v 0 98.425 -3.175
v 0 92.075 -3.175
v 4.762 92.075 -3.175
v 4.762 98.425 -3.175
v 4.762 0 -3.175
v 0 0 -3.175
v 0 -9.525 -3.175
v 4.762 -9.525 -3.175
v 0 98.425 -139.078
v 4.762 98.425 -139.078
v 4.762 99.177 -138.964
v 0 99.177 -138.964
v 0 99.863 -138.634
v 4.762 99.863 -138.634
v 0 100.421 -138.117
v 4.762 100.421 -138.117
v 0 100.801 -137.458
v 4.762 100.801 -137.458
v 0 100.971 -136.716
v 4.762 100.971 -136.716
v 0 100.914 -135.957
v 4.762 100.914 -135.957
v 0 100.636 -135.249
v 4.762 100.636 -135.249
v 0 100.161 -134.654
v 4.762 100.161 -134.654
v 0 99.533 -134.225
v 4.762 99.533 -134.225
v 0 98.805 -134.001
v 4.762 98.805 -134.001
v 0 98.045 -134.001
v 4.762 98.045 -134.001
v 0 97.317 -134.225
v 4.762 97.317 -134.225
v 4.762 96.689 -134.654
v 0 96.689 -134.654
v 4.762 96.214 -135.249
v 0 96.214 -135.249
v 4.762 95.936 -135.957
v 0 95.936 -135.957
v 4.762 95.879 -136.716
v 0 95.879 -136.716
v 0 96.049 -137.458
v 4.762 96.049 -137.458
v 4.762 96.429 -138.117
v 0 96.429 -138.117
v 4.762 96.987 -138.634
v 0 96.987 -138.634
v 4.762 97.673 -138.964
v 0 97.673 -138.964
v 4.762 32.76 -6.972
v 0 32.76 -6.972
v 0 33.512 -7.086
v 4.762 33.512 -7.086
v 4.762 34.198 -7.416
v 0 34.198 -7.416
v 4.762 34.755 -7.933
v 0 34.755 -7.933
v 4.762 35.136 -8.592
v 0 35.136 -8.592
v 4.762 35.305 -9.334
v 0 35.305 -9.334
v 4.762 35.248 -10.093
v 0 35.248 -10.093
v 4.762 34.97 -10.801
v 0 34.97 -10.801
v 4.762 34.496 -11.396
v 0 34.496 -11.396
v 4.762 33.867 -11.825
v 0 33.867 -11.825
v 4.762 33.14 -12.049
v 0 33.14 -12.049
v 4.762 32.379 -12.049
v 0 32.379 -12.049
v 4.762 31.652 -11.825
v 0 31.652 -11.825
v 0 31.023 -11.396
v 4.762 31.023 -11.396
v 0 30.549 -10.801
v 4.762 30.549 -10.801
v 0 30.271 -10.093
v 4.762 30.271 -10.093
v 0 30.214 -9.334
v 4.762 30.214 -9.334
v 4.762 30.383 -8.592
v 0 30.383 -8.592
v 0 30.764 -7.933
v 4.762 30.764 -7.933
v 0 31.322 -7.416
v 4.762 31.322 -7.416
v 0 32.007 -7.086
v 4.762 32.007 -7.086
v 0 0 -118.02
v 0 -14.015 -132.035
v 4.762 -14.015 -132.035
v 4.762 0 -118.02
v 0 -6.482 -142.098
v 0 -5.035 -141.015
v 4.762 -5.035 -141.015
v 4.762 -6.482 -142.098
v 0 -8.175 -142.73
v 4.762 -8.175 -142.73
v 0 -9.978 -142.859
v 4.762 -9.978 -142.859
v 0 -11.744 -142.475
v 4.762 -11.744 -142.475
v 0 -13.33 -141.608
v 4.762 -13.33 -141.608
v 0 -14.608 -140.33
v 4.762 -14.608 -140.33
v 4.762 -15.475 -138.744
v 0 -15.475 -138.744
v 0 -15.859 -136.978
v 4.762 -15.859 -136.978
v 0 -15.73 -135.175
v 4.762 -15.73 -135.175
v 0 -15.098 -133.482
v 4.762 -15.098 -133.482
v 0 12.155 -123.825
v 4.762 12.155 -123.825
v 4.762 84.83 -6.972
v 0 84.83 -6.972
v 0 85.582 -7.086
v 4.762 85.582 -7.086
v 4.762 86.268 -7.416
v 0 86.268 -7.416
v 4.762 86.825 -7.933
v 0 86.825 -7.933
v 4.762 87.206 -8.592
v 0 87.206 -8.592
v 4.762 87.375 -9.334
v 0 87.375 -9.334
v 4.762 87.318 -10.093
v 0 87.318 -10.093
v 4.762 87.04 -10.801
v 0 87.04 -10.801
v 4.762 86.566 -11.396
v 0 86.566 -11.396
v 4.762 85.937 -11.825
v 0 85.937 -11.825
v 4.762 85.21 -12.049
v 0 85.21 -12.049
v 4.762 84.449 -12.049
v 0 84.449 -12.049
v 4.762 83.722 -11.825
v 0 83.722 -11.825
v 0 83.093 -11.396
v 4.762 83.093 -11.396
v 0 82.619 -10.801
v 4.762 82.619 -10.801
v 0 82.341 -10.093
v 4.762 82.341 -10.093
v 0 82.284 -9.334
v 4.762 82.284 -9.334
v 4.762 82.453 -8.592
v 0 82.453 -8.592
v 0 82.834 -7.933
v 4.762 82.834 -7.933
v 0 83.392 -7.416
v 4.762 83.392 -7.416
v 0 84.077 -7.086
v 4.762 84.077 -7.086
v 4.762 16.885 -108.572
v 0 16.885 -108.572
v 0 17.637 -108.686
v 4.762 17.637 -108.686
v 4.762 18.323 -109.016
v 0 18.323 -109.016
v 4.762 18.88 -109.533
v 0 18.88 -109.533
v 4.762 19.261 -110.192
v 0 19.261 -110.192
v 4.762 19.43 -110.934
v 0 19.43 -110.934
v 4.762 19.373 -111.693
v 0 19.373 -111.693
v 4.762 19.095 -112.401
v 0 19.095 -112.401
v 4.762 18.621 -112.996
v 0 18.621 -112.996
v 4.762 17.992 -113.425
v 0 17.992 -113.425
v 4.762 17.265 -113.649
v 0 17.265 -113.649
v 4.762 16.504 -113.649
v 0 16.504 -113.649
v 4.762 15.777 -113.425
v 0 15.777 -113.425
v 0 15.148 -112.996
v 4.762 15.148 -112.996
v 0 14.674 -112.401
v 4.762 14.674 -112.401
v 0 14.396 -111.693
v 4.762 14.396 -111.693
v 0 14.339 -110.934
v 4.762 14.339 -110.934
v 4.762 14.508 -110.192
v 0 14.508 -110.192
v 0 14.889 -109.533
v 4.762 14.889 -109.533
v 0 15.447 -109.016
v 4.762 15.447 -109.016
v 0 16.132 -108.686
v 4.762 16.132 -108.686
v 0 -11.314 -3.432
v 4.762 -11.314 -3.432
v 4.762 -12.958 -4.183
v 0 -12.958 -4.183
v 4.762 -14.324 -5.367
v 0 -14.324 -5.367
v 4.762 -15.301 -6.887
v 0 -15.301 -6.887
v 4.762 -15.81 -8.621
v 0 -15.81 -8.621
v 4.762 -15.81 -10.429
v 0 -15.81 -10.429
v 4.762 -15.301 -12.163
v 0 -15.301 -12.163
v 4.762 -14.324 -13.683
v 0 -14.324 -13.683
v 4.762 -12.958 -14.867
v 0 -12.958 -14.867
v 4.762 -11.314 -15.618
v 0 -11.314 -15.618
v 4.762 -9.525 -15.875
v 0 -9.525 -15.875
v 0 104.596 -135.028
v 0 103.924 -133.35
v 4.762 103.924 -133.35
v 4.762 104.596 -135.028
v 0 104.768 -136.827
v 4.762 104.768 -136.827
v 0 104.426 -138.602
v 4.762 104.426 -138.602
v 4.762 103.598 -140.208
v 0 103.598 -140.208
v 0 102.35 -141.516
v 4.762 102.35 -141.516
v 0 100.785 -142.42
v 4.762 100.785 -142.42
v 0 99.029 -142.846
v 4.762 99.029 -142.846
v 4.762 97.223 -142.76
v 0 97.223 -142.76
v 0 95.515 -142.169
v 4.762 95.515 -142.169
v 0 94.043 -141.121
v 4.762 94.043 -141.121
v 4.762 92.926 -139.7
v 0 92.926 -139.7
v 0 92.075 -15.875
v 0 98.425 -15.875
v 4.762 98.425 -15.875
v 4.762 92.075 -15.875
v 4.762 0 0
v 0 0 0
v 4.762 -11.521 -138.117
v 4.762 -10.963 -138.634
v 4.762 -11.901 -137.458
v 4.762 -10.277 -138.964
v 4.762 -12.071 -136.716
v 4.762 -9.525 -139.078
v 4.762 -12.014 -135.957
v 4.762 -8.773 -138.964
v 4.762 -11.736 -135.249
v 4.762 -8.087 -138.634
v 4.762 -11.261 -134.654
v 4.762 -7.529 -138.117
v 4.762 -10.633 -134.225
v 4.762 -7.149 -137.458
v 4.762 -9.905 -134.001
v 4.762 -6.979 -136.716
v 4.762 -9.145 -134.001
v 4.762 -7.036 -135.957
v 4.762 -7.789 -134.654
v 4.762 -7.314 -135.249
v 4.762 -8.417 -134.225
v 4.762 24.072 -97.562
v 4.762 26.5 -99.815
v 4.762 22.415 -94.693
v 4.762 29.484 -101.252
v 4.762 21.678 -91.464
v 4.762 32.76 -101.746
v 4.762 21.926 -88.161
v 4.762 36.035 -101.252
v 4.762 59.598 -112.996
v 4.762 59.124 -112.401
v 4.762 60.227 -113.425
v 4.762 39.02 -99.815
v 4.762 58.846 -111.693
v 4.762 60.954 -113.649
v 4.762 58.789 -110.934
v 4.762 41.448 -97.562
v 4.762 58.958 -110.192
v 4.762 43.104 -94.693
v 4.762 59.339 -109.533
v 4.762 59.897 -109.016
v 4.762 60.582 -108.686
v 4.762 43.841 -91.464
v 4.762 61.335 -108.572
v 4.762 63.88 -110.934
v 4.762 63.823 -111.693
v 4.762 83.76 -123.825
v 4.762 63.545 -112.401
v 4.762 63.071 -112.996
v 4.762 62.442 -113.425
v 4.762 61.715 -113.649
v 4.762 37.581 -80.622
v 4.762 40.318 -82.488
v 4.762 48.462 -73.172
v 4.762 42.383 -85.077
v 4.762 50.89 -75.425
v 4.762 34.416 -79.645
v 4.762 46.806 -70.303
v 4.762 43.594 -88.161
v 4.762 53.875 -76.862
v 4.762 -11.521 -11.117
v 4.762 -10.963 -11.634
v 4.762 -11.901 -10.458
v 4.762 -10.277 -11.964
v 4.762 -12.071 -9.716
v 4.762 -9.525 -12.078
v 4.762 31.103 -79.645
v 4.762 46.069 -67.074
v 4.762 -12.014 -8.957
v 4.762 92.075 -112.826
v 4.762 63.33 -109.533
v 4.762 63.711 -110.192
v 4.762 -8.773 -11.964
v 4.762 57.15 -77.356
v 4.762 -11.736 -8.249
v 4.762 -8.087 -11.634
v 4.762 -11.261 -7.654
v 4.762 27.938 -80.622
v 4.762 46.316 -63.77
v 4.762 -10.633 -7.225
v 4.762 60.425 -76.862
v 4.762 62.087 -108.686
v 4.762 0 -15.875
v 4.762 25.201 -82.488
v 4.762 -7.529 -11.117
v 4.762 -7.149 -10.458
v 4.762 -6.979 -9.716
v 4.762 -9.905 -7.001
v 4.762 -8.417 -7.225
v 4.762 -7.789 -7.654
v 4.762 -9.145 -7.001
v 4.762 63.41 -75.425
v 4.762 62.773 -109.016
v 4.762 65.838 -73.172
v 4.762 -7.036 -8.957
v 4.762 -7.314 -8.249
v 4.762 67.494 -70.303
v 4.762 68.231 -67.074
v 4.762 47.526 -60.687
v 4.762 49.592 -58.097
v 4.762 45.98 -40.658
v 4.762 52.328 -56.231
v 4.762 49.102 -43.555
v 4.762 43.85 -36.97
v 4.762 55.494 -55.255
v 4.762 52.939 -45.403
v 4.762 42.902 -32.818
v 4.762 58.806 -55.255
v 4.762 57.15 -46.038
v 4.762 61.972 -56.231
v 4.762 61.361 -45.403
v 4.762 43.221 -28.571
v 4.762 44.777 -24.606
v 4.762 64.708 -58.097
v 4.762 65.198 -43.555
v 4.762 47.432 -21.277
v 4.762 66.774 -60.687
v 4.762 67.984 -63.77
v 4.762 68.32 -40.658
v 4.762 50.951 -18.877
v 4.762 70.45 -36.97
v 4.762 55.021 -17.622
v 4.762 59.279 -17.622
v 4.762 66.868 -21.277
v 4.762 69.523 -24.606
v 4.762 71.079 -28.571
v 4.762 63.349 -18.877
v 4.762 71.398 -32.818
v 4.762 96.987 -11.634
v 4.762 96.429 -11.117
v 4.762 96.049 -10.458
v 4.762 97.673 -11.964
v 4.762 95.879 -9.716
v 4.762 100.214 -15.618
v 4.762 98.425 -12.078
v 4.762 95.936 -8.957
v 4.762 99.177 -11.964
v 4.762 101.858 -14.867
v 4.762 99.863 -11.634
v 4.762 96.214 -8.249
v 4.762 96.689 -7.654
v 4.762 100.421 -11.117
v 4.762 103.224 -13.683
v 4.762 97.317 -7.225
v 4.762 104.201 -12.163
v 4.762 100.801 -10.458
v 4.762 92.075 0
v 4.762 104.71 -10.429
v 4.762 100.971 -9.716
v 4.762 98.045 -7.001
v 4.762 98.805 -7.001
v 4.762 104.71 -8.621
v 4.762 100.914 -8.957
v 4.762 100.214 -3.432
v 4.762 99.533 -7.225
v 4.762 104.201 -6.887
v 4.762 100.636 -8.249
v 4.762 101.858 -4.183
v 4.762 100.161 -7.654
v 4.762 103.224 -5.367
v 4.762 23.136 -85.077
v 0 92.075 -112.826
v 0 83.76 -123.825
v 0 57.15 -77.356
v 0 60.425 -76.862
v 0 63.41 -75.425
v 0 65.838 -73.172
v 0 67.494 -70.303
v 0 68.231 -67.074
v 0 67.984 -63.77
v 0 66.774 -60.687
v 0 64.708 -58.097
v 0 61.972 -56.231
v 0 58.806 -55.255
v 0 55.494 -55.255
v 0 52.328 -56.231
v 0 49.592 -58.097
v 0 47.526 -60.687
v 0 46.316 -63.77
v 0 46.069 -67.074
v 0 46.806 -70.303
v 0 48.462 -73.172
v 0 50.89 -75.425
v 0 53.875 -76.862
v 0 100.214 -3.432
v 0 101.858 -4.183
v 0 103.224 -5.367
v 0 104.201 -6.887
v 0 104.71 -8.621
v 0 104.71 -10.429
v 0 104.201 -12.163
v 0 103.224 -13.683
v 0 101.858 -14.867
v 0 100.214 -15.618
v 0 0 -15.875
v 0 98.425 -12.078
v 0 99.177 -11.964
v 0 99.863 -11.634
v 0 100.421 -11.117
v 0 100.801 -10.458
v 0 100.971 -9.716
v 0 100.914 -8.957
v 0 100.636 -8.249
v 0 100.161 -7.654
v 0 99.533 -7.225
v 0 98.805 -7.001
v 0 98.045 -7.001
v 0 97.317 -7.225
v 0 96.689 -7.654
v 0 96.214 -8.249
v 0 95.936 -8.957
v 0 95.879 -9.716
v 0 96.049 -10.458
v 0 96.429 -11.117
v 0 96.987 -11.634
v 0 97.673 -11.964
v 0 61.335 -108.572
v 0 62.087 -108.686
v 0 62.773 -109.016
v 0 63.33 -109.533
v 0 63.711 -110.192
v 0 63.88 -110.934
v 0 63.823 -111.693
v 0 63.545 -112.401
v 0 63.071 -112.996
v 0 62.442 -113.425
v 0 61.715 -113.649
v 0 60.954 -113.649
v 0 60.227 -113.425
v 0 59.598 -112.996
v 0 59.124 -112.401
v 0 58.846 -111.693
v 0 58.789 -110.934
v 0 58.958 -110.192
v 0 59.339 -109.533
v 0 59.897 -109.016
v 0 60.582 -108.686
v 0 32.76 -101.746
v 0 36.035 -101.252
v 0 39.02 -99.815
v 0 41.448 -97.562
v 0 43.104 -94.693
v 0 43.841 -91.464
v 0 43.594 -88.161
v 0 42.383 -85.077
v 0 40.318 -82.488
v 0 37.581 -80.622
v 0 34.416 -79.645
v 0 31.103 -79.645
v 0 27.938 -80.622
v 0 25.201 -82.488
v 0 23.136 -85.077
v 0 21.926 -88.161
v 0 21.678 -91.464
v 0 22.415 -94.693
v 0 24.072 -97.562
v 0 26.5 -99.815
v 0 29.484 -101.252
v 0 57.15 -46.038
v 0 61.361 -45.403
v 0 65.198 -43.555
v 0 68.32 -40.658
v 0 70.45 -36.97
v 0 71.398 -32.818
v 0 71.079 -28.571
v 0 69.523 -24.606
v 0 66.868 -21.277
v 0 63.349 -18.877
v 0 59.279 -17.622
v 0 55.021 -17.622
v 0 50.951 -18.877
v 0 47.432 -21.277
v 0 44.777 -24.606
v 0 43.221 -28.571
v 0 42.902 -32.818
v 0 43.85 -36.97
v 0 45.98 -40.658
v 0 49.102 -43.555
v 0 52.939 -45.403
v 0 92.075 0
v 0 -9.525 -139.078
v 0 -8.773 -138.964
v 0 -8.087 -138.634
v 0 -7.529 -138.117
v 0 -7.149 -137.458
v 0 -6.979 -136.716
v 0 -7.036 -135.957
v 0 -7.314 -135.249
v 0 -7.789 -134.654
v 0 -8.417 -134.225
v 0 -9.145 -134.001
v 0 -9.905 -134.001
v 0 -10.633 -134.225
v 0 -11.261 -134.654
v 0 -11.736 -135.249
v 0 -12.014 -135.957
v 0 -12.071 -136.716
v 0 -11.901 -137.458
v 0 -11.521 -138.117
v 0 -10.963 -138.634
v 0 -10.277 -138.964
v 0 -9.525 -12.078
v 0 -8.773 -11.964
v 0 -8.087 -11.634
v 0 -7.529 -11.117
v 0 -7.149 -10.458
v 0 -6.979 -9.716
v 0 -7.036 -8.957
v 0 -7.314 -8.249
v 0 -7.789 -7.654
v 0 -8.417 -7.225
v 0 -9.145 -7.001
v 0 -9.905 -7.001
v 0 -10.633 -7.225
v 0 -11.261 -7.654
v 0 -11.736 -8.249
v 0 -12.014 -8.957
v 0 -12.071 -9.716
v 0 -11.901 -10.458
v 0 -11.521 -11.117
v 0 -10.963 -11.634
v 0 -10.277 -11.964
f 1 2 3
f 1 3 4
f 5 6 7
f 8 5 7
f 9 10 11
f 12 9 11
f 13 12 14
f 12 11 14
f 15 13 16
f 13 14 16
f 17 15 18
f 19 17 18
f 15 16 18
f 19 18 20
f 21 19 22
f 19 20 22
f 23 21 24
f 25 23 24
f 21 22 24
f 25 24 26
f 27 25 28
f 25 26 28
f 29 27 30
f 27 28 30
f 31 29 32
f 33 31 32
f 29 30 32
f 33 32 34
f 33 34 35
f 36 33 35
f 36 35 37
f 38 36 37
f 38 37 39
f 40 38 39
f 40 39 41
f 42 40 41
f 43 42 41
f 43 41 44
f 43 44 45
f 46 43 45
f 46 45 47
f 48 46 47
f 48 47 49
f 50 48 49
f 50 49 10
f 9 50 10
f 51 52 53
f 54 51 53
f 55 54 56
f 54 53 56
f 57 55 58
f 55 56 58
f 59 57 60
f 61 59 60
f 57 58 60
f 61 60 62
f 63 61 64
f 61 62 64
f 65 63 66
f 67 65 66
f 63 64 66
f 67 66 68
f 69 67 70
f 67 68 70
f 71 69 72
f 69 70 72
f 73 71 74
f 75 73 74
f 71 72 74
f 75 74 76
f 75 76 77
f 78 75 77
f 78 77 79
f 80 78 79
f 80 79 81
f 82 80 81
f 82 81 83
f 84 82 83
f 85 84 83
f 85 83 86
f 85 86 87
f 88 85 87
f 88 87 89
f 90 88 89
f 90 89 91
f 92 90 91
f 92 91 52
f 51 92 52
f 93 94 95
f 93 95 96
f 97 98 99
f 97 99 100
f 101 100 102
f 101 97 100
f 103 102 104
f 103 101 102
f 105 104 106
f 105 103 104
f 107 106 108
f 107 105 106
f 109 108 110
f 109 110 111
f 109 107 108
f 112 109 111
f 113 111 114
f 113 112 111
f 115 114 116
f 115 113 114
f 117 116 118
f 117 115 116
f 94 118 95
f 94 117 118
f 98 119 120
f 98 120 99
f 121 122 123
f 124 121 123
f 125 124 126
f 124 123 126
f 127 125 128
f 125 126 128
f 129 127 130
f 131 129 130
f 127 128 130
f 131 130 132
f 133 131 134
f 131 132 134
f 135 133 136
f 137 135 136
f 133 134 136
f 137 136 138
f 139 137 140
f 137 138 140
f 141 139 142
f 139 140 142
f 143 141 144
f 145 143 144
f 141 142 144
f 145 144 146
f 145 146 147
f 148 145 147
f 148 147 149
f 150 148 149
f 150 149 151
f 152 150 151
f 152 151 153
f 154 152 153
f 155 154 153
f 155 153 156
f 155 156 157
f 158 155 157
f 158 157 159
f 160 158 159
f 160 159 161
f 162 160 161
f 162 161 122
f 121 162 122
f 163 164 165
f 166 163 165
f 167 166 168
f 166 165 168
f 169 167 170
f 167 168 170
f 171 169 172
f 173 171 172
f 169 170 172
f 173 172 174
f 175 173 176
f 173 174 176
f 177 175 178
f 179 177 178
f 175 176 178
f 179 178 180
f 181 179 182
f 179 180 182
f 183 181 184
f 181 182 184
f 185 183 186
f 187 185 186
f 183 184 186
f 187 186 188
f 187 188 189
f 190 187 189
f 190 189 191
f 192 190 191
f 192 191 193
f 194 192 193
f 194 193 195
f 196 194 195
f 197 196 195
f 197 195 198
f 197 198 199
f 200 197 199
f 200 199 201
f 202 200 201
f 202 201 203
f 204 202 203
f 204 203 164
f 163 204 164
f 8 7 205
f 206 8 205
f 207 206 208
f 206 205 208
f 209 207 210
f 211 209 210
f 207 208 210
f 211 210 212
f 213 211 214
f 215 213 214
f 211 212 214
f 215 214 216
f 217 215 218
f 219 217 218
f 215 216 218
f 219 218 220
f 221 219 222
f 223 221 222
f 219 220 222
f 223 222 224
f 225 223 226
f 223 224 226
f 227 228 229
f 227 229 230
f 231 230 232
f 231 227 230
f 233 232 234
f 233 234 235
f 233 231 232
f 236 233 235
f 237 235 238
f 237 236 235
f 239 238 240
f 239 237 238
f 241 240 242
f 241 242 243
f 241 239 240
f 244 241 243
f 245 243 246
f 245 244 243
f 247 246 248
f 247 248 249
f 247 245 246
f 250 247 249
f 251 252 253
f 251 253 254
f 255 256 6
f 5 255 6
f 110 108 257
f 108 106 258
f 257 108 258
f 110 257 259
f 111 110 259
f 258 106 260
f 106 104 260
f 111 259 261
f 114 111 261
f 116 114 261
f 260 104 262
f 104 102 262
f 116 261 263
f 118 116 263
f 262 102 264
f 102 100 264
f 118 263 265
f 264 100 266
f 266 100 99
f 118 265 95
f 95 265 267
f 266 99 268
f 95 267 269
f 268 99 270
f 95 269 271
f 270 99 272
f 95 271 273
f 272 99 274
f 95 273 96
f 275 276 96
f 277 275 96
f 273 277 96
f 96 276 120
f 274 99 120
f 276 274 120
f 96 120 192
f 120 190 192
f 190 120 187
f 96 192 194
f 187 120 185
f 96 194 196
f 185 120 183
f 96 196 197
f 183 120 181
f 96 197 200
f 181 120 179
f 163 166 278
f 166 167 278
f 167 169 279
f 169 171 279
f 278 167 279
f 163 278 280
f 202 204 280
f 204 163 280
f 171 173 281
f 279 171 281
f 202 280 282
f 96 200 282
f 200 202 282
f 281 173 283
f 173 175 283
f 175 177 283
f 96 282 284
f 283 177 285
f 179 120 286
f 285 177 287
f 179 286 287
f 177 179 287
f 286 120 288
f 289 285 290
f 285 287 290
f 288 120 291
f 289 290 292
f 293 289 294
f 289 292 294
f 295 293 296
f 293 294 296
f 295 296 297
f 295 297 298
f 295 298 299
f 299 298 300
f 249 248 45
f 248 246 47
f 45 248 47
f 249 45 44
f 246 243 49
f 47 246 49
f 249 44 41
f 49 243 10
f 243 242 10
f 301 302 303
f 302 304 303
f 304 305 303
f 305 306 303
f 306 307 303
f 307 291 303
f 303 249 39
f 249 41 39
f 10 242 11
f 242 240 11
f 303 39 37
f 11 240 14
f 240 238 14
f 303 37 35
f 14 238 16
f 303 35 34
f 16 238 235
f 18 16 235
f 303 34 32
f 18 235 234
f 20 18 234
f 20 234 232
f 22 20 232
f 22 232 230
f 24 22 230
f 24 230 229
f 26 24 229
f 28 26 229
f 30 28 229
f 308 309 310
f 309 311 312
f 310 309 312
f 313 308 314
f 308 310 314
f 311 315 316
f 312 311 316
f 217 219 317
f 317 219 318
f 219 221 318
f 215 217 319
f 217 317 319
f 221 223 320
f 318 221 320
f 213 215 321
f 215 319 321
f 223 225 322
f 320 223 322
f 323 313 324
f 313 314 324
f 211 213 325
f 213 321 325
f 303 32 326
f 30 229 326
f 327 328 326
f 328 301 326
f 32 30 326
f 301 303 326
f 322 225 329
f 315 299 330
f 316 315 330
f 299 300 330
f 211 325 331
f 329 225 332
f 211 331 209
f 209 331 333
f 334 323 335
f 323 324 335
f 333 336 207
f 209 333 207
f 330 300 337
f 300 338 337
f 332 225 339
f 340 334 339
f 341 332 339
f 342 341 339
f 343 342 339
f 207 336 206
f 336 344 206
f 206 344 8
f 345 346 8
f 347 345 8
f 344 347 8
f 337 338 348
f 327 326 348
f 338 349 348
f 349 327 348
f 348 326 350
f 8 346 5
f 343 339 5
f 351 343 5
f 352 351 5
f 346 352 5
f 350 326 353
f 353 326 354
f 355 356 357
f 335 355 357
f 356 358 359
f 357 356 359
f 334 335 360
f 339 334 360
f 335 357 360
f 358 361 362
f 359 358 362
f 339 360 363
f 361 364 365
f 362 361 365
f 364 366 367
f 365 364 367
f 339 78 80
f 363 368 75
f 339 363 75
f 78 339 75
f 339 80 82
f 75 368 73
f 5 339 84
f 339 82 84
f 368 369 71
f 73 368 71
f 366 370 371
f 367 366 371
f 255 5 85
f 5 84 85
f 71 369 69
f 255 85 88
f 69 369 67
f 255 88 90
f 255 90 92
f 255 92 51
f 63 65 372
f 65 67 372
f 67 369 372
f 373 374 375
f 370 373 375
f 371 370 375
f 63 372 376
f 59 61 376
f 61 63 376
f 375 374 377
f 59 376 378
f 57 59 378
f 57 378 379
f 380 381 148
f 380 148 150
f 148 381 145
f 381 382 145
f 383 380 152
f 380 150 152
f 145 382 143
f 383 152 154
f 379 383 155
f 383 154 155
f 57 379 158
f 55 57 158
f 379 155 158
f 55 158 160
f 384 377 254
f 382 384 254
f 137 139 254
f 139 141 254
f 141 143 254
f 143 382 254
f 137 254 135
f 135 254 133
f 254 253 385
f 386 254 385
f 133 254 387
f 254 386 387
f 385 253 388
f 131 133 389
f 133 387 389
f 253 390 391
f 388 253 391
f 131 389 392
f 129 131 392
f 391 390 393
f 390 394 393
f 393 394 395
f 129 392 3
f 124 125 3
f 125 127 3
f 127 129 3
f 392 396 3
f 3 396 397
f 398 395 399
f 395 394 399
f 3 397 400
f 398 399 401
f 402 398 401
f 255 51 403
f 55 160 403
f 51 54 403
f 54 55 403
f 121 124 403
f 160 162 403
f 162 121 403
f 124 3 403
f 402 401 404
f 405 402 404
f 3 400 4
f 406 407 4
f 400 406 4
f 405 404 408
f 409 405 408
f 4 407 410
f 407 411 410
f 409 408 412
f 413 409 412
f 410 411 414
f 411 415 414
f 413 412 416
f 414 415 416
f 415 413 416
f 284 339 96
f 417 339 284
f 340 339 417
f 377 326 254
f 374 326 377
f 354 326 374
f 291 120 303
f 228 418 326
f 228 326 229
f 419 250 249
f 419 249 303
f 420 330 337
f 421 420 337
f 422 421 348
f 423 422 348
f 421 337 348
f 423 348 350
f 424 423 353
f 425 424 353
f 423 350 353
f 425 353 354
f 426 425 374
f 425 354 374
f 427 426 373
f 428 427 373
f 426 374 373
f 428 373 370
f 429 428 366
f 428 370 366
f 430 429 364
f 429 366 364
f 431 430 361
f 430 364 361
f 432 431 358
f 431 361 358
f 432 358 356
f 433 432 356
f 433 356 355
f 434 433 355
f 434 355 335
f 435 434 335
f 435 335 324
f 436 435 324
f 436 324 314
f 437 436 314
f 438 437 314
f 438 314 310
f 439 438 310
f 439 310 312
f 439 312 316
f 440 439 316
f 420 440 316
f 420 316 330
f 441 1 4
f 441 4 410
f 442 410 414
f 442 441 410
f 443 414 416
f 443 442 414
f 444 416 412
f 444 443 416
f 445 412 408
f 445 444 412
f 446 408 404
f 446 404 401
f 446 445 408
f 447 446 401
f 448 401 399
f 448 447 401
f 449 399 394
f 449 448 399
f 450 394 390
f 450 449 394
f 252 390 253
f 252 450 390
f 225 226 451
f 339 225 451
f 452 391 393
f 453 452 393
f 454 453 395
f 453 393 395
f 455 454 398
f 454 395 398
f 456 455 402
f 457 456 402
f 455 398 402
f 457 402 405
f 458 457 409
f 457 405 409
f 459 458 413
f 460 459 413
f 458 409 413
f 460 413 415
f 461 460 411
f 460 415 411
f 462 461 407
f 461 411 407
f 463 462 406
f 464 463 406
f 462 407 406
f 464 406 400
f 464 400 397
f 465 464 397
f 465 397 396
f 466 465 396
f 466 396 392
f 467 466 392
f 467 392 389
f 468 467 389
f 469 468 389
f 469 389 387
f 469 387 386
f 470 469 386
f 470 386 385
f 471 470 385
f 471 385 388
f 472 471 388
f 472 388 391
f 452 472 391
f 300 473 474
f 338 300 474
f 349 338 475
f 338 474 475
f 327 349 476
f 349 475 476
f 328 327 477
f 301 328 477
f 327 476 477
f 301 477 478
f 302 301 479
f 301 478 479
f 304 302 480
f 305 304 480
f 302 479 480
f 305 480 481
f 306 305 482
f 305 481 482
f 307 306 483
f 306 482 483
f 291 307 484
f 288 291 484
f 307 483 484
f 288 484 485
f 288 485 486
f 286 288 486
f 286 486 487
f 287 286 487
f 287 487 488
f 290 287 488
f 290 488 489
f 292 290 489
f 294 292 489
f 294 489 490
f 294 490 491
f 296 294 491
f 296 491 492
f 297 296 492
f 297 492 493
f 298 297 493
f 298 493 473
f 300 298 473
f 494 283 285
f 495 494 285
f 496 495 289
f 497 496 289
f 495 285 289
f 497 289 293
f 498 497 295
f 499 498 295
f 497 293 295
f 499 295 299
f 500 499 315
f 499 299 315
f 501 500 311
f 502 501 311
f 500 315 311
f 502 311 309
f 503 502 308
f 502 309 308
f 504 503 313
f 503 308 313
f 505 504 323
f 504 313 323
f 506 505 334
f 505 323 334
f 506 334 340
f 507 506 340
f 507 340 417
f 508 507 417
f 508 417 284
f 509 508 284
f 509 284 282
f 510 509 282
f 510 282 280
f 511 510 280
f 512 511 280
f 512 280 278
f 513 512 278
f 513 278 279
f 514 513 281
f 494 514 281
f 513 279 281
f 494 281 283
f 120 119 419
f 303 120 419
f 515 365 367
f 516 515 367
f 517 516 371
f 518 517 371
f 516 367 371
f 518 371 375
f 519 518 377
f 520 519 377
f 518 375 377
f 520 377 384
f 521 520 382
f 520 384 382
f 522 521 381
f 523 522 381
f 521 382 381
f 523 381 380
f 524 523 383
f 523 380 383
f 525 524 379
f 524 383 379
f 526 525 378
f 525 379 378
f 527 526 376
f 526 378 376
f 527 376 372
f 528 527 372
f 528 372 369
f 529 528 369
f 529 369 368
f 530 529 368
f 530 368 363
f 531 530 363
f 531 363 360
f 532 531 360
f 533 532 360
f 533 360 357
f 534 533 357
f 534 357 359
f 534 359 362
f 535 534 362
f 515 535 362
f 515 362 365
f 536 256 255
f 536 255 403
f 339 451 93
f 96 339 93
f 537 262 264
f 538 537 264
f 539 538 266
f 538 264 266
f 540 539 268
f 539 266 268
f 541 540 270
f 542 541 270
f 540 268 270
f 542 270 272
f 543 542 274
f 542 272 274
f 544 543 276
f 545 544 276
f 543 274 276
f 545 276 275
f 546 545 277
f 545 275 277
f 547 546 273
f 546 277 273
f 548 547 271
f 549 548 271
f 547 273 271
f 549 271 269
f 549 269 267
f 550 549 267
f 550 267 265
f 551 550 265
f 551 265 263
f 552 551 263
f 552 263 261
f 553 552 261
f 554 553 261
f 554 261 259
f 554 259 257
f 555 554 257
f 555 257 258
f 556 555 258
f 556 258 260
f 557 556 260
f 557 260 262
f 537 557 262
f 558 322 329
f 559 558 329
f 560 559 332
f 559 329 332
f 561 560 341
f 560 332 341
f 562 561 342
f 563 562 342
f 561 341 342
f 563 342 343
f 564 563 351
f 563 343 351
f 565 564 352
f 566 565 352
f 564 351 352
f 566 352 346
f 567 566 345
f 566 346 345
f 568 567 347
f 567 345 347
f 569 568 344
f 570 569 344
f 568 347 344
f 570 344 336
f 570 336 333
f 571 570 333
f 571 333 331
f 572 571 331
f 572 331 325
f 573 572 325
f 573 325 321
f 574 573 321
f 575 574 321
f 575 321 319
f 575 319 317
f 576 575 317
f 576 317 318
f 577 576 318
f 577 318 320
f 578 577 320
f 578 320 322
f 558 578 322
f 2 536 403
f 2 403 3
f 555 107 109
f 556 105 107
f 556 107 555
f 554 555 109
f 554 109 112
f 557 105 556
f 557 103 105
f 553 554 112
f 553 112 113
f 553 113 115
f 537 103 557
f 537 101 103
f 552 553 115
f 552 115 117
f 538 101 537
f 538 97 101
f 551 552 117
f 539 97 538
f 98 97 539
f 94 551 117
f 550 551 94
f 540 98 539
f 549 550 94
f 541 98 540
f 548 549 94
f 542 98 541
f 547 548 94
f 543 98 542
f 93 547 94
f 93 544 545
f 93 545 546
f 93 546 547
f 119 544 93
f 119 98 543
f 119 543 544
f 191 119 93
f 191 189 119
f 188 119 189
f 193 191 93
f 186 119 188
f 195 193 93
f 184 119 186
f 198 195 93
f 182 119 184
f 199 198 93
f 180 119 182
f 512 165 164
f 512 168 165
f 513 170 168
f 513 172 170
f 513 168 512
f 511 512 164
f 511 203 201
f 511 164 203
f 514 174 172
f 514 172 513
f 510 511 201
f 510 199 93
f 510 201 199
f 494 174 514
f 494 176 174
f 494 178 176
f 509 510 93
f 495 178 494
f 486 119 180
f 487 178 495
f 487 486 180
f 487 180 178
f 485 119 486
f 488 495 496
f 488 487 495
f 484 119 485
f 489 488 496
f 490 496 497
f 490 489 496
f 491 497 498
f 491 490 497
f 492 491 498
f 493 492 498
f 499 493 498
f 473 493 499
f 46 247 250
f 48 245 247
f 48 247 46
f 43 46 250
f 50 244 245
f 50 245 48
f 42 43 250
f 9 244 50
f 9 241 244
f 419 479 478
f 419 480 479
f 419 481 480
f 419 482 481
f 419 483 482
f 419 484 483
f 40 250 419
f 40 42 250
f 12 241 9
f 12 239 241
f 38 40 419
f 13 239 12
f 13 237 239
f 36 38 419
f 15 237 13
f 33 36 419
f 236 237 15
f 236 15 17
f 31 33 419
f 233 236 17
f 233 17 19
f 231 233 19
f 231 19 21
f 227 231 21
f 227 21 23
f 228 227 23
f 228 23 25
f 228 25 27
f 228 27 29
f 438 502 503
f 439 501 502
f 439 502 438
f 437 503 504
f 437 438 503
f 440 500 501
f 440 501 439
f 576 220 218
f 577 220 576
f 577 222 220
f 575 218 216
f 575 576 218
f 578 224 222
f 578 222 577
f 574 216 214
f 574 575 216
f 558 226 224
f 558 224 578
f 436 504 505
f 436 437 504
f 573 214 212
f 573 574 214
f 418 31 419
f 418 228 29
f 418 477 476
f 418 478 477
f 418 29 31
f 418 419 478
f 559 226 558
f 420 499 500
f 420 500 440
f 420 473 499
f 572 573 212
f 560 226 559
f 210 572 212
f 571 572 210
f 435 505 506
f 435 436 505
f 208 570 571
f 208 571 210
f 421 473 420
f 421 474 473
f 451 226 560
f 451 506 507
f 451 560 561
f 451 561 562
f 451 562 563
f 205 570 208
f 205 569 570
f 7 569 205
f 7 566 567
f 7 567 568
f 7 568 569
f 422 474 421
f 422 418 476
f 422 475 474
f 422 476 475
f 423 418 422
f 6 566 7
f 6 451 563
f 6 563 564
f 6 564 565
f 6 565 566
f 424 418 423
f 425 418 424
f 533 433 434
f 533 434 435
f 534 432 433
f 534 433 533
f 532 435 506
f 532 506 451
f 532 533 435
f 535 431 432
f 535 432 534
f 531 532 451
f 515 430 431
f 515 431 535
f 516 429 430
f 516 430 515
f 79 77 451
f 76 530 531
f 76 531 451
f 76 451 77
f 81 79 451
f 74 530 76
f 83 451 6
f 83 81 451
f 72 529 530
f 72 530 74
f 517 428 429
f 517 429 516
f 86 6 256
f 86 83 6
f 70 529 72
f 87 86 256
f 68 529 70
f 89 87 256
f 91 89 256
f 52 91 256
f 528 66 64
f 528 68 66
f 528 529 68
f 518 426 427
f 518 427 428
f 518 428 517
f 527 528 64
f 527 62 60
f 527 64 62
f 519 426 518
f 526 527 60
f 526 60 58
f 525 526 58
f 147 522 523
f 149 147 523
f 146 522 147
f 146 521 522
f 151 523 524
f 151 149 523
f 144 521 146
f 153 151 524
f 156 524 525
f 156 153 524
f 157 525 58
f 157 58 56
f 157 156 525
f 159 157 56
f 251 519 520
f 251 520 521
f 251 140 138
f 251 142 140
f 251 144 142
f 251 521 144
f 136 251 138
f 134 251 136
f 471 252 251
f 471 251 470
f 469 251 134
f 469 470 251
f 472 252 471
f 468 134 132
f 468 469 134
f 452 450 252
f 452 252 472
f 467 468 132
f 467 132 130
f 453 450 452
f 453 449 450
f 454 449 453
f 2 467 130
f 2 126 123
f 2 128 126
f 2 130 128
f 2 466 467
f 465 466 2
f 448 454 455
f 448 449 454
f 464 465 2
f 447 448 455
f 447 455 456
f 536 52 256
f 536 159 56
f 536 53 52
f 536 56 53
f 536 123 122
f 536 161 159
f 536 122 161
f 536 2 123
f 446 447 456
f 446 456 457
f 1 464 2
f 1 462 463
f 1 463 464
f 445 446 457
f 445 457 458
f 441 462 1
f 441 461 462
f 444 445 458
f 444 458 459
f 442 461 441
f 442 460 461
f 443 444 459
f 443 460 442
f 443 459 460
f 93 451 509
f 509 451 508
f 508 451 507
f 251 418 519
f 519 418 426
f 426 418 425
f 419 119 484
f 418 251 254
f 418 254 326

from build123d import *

# Parameters (mm, degrees)
SKETCH1_W              = 123.825
SKETCH1_H              = 92.075
BOSS_EXTRUDE2_DEPTH    = 4.7625
SKETCH2_R              = 11.1125
SKETCH2_R_2            = 14.2875
CUT_EXTRUDE1_DEPTH     = 5.7625
F_10_CLEARANCE_HOLE1_D = 5.1054
SKETCH8_R              = 14.2875
CUT_EXTRUDE3_DEPTH     = 5.7625
SKETCH9_R              = 14.2875
SKETCH9_R_2            = 11.1125
BOSS_EXTRUDE3_DEPTH    = 4.7625
BOSS_EXTRUDE4_DEPTH    = 4.7625
F_10_CLEARANCE_HOLE2_D = 5.1054


with BuildPart() as part:
    # Sketch1 → Boss-Extrude2 (new body)
    with BuildSketch(Plane(origin=(0, 0, 0), x_dir=(0, 0, -1), z_dir=(1, 0, 0))):
        with Locations((61.9125, 46.0375)):
            Rectangle(SKETCH1_W, SKETCH1_H)
    extrude(amount=BOSS_EXTRUDE2_DEPTH)

    # Sketch2 → Cut-Extrude1 (cut, through all)
    with BuildSketch(Plane(origin=(4.7625, 0, 0), x_dir=(0, 0, -1), z_dir=(1, 0, 0))):
        with Locations((66.2432, 57.15)):
            Circle(SKETCH2_R)
        with Locations((31.75, 57.15)):
            Circle(SKETCH2_R)
        with Locations((90.633575625, 32.759624375)):
            Circle(SKETCH2_R_2)
    extrude(amount=-CUT_EXTRUDE1_DEPTH, mode=Mode.SUBTRACT)

    # #10 Clearance Hole1 (through all)
    with Locations(Plane(origin=(4.7625, 0, 0), x_dir=(0, 0, -1), z_dir=(1, 0, 0))):
        with Locations((9.525, 84.829624375), (111.125, 61.334624375), (9.525, 32.759624375), (111.125, 16.884624375)):
            Hole(F_10_CLEARANCE_HOLE1_D / 2)

    # Sketch8 → Cut-Extrude3 (cut, through all)
    with BuildSketch(Plane(origin=(4.7625, 0, 0), x_dir=(0, 0, -1), z_dir=(1, 0, 0))):
        with Locations((31.75, 57.15)):
            Circle(SKETCH8_R)
    extrude(amount=-CUT_EXTRUDE3_DEPTH, mode=Mode.SUBTRACT)

    # Sketch9 → Boss-Extrude3 (add)
    with BuildSketch(Plane(origin=(4.7625, 0, 0), x_dir=(0, 0, -1), z_dir=(1, 0, 0))):
        with Locations((90.633575625, 32.759624375)):
            Circle(SKETCH9_R)
        with Locations((90.633575625, 32.759624375)):
            Circle(SKETCH9_R_2, mode=Mode.SUBTRACT)
    extrude(amount=-BOSS_EXTRUDE3_DEPTH)

    # Sketch11 → Boss-Extrude4 (add)
    with BuildSketch(Plane.ZY):
        with BuildLine():
            Line((-132.034871939, -14.015128061), (-118.019743879, 0))
            Line((-118.019743879, 0), (-123.825, 0))
            Line((-123.825, 0), (-123.825, 12.155256121))
            Line((-123.825, 12.155256121), (-141.015128061, -5.034871939))
            ThreePointArc((-141.015128061, -5.034871939), (-141.015128061, -14.015128061), (-132.034871939, -14.015128061))
        make_face()
        with BuildLine():
            Line((-139.7, 92.925738686), (-123.825, 83.760303163))
            Line((-123.825, 83.760303163), (-123.825, 92.075))
            Line((-123.825, 92.075), (-112.826477372, 92.075))
            Line((-112.826477372, 92.075), (-133.35, 103.924261314))
            ThreePointArc((-133.35, 103.924261314), (-142.024261314, 101.6), (-139.7, 92.925738686))
        make_face()
        with BuildLine():
            Line((-15.875, -9.525), (-15.875, 0))
            Line((-15.875, 0), (-3.175, 0))
            Line((-3.175, 0), (-3.175, -9.525))
            ThreePointArc((-3.175, -9.525), (-9.525, -15.875), (-15.875, -9.525))
        make_face()
        with BuildLine():
            Line((-15.875, 98.425), (-15.875, 92.075))
            Line((-15.875, 92.075), (-3.175, 92.075))
            Line((-3.175, 92.075), (-3.175, 98.425))
            ThreePointArc((-3.175, 98.425), (-9.525, 104.775), (-15.875, 98.425))
        make_face()
    extrude(amount=-BOSS_EXTRUDE4_DEPTH)

    # #10 Clearance Hole2 (through all)
    with Locations(Plane.ZY):
        with Locations((-136.525, -9.525), (-136.525, 98.425), (-9.525, 98.425), (-9.525, -9.525)):
            Hole(F_10_CLEARANCE_HOLE2_D / 2)


solid = part.part
